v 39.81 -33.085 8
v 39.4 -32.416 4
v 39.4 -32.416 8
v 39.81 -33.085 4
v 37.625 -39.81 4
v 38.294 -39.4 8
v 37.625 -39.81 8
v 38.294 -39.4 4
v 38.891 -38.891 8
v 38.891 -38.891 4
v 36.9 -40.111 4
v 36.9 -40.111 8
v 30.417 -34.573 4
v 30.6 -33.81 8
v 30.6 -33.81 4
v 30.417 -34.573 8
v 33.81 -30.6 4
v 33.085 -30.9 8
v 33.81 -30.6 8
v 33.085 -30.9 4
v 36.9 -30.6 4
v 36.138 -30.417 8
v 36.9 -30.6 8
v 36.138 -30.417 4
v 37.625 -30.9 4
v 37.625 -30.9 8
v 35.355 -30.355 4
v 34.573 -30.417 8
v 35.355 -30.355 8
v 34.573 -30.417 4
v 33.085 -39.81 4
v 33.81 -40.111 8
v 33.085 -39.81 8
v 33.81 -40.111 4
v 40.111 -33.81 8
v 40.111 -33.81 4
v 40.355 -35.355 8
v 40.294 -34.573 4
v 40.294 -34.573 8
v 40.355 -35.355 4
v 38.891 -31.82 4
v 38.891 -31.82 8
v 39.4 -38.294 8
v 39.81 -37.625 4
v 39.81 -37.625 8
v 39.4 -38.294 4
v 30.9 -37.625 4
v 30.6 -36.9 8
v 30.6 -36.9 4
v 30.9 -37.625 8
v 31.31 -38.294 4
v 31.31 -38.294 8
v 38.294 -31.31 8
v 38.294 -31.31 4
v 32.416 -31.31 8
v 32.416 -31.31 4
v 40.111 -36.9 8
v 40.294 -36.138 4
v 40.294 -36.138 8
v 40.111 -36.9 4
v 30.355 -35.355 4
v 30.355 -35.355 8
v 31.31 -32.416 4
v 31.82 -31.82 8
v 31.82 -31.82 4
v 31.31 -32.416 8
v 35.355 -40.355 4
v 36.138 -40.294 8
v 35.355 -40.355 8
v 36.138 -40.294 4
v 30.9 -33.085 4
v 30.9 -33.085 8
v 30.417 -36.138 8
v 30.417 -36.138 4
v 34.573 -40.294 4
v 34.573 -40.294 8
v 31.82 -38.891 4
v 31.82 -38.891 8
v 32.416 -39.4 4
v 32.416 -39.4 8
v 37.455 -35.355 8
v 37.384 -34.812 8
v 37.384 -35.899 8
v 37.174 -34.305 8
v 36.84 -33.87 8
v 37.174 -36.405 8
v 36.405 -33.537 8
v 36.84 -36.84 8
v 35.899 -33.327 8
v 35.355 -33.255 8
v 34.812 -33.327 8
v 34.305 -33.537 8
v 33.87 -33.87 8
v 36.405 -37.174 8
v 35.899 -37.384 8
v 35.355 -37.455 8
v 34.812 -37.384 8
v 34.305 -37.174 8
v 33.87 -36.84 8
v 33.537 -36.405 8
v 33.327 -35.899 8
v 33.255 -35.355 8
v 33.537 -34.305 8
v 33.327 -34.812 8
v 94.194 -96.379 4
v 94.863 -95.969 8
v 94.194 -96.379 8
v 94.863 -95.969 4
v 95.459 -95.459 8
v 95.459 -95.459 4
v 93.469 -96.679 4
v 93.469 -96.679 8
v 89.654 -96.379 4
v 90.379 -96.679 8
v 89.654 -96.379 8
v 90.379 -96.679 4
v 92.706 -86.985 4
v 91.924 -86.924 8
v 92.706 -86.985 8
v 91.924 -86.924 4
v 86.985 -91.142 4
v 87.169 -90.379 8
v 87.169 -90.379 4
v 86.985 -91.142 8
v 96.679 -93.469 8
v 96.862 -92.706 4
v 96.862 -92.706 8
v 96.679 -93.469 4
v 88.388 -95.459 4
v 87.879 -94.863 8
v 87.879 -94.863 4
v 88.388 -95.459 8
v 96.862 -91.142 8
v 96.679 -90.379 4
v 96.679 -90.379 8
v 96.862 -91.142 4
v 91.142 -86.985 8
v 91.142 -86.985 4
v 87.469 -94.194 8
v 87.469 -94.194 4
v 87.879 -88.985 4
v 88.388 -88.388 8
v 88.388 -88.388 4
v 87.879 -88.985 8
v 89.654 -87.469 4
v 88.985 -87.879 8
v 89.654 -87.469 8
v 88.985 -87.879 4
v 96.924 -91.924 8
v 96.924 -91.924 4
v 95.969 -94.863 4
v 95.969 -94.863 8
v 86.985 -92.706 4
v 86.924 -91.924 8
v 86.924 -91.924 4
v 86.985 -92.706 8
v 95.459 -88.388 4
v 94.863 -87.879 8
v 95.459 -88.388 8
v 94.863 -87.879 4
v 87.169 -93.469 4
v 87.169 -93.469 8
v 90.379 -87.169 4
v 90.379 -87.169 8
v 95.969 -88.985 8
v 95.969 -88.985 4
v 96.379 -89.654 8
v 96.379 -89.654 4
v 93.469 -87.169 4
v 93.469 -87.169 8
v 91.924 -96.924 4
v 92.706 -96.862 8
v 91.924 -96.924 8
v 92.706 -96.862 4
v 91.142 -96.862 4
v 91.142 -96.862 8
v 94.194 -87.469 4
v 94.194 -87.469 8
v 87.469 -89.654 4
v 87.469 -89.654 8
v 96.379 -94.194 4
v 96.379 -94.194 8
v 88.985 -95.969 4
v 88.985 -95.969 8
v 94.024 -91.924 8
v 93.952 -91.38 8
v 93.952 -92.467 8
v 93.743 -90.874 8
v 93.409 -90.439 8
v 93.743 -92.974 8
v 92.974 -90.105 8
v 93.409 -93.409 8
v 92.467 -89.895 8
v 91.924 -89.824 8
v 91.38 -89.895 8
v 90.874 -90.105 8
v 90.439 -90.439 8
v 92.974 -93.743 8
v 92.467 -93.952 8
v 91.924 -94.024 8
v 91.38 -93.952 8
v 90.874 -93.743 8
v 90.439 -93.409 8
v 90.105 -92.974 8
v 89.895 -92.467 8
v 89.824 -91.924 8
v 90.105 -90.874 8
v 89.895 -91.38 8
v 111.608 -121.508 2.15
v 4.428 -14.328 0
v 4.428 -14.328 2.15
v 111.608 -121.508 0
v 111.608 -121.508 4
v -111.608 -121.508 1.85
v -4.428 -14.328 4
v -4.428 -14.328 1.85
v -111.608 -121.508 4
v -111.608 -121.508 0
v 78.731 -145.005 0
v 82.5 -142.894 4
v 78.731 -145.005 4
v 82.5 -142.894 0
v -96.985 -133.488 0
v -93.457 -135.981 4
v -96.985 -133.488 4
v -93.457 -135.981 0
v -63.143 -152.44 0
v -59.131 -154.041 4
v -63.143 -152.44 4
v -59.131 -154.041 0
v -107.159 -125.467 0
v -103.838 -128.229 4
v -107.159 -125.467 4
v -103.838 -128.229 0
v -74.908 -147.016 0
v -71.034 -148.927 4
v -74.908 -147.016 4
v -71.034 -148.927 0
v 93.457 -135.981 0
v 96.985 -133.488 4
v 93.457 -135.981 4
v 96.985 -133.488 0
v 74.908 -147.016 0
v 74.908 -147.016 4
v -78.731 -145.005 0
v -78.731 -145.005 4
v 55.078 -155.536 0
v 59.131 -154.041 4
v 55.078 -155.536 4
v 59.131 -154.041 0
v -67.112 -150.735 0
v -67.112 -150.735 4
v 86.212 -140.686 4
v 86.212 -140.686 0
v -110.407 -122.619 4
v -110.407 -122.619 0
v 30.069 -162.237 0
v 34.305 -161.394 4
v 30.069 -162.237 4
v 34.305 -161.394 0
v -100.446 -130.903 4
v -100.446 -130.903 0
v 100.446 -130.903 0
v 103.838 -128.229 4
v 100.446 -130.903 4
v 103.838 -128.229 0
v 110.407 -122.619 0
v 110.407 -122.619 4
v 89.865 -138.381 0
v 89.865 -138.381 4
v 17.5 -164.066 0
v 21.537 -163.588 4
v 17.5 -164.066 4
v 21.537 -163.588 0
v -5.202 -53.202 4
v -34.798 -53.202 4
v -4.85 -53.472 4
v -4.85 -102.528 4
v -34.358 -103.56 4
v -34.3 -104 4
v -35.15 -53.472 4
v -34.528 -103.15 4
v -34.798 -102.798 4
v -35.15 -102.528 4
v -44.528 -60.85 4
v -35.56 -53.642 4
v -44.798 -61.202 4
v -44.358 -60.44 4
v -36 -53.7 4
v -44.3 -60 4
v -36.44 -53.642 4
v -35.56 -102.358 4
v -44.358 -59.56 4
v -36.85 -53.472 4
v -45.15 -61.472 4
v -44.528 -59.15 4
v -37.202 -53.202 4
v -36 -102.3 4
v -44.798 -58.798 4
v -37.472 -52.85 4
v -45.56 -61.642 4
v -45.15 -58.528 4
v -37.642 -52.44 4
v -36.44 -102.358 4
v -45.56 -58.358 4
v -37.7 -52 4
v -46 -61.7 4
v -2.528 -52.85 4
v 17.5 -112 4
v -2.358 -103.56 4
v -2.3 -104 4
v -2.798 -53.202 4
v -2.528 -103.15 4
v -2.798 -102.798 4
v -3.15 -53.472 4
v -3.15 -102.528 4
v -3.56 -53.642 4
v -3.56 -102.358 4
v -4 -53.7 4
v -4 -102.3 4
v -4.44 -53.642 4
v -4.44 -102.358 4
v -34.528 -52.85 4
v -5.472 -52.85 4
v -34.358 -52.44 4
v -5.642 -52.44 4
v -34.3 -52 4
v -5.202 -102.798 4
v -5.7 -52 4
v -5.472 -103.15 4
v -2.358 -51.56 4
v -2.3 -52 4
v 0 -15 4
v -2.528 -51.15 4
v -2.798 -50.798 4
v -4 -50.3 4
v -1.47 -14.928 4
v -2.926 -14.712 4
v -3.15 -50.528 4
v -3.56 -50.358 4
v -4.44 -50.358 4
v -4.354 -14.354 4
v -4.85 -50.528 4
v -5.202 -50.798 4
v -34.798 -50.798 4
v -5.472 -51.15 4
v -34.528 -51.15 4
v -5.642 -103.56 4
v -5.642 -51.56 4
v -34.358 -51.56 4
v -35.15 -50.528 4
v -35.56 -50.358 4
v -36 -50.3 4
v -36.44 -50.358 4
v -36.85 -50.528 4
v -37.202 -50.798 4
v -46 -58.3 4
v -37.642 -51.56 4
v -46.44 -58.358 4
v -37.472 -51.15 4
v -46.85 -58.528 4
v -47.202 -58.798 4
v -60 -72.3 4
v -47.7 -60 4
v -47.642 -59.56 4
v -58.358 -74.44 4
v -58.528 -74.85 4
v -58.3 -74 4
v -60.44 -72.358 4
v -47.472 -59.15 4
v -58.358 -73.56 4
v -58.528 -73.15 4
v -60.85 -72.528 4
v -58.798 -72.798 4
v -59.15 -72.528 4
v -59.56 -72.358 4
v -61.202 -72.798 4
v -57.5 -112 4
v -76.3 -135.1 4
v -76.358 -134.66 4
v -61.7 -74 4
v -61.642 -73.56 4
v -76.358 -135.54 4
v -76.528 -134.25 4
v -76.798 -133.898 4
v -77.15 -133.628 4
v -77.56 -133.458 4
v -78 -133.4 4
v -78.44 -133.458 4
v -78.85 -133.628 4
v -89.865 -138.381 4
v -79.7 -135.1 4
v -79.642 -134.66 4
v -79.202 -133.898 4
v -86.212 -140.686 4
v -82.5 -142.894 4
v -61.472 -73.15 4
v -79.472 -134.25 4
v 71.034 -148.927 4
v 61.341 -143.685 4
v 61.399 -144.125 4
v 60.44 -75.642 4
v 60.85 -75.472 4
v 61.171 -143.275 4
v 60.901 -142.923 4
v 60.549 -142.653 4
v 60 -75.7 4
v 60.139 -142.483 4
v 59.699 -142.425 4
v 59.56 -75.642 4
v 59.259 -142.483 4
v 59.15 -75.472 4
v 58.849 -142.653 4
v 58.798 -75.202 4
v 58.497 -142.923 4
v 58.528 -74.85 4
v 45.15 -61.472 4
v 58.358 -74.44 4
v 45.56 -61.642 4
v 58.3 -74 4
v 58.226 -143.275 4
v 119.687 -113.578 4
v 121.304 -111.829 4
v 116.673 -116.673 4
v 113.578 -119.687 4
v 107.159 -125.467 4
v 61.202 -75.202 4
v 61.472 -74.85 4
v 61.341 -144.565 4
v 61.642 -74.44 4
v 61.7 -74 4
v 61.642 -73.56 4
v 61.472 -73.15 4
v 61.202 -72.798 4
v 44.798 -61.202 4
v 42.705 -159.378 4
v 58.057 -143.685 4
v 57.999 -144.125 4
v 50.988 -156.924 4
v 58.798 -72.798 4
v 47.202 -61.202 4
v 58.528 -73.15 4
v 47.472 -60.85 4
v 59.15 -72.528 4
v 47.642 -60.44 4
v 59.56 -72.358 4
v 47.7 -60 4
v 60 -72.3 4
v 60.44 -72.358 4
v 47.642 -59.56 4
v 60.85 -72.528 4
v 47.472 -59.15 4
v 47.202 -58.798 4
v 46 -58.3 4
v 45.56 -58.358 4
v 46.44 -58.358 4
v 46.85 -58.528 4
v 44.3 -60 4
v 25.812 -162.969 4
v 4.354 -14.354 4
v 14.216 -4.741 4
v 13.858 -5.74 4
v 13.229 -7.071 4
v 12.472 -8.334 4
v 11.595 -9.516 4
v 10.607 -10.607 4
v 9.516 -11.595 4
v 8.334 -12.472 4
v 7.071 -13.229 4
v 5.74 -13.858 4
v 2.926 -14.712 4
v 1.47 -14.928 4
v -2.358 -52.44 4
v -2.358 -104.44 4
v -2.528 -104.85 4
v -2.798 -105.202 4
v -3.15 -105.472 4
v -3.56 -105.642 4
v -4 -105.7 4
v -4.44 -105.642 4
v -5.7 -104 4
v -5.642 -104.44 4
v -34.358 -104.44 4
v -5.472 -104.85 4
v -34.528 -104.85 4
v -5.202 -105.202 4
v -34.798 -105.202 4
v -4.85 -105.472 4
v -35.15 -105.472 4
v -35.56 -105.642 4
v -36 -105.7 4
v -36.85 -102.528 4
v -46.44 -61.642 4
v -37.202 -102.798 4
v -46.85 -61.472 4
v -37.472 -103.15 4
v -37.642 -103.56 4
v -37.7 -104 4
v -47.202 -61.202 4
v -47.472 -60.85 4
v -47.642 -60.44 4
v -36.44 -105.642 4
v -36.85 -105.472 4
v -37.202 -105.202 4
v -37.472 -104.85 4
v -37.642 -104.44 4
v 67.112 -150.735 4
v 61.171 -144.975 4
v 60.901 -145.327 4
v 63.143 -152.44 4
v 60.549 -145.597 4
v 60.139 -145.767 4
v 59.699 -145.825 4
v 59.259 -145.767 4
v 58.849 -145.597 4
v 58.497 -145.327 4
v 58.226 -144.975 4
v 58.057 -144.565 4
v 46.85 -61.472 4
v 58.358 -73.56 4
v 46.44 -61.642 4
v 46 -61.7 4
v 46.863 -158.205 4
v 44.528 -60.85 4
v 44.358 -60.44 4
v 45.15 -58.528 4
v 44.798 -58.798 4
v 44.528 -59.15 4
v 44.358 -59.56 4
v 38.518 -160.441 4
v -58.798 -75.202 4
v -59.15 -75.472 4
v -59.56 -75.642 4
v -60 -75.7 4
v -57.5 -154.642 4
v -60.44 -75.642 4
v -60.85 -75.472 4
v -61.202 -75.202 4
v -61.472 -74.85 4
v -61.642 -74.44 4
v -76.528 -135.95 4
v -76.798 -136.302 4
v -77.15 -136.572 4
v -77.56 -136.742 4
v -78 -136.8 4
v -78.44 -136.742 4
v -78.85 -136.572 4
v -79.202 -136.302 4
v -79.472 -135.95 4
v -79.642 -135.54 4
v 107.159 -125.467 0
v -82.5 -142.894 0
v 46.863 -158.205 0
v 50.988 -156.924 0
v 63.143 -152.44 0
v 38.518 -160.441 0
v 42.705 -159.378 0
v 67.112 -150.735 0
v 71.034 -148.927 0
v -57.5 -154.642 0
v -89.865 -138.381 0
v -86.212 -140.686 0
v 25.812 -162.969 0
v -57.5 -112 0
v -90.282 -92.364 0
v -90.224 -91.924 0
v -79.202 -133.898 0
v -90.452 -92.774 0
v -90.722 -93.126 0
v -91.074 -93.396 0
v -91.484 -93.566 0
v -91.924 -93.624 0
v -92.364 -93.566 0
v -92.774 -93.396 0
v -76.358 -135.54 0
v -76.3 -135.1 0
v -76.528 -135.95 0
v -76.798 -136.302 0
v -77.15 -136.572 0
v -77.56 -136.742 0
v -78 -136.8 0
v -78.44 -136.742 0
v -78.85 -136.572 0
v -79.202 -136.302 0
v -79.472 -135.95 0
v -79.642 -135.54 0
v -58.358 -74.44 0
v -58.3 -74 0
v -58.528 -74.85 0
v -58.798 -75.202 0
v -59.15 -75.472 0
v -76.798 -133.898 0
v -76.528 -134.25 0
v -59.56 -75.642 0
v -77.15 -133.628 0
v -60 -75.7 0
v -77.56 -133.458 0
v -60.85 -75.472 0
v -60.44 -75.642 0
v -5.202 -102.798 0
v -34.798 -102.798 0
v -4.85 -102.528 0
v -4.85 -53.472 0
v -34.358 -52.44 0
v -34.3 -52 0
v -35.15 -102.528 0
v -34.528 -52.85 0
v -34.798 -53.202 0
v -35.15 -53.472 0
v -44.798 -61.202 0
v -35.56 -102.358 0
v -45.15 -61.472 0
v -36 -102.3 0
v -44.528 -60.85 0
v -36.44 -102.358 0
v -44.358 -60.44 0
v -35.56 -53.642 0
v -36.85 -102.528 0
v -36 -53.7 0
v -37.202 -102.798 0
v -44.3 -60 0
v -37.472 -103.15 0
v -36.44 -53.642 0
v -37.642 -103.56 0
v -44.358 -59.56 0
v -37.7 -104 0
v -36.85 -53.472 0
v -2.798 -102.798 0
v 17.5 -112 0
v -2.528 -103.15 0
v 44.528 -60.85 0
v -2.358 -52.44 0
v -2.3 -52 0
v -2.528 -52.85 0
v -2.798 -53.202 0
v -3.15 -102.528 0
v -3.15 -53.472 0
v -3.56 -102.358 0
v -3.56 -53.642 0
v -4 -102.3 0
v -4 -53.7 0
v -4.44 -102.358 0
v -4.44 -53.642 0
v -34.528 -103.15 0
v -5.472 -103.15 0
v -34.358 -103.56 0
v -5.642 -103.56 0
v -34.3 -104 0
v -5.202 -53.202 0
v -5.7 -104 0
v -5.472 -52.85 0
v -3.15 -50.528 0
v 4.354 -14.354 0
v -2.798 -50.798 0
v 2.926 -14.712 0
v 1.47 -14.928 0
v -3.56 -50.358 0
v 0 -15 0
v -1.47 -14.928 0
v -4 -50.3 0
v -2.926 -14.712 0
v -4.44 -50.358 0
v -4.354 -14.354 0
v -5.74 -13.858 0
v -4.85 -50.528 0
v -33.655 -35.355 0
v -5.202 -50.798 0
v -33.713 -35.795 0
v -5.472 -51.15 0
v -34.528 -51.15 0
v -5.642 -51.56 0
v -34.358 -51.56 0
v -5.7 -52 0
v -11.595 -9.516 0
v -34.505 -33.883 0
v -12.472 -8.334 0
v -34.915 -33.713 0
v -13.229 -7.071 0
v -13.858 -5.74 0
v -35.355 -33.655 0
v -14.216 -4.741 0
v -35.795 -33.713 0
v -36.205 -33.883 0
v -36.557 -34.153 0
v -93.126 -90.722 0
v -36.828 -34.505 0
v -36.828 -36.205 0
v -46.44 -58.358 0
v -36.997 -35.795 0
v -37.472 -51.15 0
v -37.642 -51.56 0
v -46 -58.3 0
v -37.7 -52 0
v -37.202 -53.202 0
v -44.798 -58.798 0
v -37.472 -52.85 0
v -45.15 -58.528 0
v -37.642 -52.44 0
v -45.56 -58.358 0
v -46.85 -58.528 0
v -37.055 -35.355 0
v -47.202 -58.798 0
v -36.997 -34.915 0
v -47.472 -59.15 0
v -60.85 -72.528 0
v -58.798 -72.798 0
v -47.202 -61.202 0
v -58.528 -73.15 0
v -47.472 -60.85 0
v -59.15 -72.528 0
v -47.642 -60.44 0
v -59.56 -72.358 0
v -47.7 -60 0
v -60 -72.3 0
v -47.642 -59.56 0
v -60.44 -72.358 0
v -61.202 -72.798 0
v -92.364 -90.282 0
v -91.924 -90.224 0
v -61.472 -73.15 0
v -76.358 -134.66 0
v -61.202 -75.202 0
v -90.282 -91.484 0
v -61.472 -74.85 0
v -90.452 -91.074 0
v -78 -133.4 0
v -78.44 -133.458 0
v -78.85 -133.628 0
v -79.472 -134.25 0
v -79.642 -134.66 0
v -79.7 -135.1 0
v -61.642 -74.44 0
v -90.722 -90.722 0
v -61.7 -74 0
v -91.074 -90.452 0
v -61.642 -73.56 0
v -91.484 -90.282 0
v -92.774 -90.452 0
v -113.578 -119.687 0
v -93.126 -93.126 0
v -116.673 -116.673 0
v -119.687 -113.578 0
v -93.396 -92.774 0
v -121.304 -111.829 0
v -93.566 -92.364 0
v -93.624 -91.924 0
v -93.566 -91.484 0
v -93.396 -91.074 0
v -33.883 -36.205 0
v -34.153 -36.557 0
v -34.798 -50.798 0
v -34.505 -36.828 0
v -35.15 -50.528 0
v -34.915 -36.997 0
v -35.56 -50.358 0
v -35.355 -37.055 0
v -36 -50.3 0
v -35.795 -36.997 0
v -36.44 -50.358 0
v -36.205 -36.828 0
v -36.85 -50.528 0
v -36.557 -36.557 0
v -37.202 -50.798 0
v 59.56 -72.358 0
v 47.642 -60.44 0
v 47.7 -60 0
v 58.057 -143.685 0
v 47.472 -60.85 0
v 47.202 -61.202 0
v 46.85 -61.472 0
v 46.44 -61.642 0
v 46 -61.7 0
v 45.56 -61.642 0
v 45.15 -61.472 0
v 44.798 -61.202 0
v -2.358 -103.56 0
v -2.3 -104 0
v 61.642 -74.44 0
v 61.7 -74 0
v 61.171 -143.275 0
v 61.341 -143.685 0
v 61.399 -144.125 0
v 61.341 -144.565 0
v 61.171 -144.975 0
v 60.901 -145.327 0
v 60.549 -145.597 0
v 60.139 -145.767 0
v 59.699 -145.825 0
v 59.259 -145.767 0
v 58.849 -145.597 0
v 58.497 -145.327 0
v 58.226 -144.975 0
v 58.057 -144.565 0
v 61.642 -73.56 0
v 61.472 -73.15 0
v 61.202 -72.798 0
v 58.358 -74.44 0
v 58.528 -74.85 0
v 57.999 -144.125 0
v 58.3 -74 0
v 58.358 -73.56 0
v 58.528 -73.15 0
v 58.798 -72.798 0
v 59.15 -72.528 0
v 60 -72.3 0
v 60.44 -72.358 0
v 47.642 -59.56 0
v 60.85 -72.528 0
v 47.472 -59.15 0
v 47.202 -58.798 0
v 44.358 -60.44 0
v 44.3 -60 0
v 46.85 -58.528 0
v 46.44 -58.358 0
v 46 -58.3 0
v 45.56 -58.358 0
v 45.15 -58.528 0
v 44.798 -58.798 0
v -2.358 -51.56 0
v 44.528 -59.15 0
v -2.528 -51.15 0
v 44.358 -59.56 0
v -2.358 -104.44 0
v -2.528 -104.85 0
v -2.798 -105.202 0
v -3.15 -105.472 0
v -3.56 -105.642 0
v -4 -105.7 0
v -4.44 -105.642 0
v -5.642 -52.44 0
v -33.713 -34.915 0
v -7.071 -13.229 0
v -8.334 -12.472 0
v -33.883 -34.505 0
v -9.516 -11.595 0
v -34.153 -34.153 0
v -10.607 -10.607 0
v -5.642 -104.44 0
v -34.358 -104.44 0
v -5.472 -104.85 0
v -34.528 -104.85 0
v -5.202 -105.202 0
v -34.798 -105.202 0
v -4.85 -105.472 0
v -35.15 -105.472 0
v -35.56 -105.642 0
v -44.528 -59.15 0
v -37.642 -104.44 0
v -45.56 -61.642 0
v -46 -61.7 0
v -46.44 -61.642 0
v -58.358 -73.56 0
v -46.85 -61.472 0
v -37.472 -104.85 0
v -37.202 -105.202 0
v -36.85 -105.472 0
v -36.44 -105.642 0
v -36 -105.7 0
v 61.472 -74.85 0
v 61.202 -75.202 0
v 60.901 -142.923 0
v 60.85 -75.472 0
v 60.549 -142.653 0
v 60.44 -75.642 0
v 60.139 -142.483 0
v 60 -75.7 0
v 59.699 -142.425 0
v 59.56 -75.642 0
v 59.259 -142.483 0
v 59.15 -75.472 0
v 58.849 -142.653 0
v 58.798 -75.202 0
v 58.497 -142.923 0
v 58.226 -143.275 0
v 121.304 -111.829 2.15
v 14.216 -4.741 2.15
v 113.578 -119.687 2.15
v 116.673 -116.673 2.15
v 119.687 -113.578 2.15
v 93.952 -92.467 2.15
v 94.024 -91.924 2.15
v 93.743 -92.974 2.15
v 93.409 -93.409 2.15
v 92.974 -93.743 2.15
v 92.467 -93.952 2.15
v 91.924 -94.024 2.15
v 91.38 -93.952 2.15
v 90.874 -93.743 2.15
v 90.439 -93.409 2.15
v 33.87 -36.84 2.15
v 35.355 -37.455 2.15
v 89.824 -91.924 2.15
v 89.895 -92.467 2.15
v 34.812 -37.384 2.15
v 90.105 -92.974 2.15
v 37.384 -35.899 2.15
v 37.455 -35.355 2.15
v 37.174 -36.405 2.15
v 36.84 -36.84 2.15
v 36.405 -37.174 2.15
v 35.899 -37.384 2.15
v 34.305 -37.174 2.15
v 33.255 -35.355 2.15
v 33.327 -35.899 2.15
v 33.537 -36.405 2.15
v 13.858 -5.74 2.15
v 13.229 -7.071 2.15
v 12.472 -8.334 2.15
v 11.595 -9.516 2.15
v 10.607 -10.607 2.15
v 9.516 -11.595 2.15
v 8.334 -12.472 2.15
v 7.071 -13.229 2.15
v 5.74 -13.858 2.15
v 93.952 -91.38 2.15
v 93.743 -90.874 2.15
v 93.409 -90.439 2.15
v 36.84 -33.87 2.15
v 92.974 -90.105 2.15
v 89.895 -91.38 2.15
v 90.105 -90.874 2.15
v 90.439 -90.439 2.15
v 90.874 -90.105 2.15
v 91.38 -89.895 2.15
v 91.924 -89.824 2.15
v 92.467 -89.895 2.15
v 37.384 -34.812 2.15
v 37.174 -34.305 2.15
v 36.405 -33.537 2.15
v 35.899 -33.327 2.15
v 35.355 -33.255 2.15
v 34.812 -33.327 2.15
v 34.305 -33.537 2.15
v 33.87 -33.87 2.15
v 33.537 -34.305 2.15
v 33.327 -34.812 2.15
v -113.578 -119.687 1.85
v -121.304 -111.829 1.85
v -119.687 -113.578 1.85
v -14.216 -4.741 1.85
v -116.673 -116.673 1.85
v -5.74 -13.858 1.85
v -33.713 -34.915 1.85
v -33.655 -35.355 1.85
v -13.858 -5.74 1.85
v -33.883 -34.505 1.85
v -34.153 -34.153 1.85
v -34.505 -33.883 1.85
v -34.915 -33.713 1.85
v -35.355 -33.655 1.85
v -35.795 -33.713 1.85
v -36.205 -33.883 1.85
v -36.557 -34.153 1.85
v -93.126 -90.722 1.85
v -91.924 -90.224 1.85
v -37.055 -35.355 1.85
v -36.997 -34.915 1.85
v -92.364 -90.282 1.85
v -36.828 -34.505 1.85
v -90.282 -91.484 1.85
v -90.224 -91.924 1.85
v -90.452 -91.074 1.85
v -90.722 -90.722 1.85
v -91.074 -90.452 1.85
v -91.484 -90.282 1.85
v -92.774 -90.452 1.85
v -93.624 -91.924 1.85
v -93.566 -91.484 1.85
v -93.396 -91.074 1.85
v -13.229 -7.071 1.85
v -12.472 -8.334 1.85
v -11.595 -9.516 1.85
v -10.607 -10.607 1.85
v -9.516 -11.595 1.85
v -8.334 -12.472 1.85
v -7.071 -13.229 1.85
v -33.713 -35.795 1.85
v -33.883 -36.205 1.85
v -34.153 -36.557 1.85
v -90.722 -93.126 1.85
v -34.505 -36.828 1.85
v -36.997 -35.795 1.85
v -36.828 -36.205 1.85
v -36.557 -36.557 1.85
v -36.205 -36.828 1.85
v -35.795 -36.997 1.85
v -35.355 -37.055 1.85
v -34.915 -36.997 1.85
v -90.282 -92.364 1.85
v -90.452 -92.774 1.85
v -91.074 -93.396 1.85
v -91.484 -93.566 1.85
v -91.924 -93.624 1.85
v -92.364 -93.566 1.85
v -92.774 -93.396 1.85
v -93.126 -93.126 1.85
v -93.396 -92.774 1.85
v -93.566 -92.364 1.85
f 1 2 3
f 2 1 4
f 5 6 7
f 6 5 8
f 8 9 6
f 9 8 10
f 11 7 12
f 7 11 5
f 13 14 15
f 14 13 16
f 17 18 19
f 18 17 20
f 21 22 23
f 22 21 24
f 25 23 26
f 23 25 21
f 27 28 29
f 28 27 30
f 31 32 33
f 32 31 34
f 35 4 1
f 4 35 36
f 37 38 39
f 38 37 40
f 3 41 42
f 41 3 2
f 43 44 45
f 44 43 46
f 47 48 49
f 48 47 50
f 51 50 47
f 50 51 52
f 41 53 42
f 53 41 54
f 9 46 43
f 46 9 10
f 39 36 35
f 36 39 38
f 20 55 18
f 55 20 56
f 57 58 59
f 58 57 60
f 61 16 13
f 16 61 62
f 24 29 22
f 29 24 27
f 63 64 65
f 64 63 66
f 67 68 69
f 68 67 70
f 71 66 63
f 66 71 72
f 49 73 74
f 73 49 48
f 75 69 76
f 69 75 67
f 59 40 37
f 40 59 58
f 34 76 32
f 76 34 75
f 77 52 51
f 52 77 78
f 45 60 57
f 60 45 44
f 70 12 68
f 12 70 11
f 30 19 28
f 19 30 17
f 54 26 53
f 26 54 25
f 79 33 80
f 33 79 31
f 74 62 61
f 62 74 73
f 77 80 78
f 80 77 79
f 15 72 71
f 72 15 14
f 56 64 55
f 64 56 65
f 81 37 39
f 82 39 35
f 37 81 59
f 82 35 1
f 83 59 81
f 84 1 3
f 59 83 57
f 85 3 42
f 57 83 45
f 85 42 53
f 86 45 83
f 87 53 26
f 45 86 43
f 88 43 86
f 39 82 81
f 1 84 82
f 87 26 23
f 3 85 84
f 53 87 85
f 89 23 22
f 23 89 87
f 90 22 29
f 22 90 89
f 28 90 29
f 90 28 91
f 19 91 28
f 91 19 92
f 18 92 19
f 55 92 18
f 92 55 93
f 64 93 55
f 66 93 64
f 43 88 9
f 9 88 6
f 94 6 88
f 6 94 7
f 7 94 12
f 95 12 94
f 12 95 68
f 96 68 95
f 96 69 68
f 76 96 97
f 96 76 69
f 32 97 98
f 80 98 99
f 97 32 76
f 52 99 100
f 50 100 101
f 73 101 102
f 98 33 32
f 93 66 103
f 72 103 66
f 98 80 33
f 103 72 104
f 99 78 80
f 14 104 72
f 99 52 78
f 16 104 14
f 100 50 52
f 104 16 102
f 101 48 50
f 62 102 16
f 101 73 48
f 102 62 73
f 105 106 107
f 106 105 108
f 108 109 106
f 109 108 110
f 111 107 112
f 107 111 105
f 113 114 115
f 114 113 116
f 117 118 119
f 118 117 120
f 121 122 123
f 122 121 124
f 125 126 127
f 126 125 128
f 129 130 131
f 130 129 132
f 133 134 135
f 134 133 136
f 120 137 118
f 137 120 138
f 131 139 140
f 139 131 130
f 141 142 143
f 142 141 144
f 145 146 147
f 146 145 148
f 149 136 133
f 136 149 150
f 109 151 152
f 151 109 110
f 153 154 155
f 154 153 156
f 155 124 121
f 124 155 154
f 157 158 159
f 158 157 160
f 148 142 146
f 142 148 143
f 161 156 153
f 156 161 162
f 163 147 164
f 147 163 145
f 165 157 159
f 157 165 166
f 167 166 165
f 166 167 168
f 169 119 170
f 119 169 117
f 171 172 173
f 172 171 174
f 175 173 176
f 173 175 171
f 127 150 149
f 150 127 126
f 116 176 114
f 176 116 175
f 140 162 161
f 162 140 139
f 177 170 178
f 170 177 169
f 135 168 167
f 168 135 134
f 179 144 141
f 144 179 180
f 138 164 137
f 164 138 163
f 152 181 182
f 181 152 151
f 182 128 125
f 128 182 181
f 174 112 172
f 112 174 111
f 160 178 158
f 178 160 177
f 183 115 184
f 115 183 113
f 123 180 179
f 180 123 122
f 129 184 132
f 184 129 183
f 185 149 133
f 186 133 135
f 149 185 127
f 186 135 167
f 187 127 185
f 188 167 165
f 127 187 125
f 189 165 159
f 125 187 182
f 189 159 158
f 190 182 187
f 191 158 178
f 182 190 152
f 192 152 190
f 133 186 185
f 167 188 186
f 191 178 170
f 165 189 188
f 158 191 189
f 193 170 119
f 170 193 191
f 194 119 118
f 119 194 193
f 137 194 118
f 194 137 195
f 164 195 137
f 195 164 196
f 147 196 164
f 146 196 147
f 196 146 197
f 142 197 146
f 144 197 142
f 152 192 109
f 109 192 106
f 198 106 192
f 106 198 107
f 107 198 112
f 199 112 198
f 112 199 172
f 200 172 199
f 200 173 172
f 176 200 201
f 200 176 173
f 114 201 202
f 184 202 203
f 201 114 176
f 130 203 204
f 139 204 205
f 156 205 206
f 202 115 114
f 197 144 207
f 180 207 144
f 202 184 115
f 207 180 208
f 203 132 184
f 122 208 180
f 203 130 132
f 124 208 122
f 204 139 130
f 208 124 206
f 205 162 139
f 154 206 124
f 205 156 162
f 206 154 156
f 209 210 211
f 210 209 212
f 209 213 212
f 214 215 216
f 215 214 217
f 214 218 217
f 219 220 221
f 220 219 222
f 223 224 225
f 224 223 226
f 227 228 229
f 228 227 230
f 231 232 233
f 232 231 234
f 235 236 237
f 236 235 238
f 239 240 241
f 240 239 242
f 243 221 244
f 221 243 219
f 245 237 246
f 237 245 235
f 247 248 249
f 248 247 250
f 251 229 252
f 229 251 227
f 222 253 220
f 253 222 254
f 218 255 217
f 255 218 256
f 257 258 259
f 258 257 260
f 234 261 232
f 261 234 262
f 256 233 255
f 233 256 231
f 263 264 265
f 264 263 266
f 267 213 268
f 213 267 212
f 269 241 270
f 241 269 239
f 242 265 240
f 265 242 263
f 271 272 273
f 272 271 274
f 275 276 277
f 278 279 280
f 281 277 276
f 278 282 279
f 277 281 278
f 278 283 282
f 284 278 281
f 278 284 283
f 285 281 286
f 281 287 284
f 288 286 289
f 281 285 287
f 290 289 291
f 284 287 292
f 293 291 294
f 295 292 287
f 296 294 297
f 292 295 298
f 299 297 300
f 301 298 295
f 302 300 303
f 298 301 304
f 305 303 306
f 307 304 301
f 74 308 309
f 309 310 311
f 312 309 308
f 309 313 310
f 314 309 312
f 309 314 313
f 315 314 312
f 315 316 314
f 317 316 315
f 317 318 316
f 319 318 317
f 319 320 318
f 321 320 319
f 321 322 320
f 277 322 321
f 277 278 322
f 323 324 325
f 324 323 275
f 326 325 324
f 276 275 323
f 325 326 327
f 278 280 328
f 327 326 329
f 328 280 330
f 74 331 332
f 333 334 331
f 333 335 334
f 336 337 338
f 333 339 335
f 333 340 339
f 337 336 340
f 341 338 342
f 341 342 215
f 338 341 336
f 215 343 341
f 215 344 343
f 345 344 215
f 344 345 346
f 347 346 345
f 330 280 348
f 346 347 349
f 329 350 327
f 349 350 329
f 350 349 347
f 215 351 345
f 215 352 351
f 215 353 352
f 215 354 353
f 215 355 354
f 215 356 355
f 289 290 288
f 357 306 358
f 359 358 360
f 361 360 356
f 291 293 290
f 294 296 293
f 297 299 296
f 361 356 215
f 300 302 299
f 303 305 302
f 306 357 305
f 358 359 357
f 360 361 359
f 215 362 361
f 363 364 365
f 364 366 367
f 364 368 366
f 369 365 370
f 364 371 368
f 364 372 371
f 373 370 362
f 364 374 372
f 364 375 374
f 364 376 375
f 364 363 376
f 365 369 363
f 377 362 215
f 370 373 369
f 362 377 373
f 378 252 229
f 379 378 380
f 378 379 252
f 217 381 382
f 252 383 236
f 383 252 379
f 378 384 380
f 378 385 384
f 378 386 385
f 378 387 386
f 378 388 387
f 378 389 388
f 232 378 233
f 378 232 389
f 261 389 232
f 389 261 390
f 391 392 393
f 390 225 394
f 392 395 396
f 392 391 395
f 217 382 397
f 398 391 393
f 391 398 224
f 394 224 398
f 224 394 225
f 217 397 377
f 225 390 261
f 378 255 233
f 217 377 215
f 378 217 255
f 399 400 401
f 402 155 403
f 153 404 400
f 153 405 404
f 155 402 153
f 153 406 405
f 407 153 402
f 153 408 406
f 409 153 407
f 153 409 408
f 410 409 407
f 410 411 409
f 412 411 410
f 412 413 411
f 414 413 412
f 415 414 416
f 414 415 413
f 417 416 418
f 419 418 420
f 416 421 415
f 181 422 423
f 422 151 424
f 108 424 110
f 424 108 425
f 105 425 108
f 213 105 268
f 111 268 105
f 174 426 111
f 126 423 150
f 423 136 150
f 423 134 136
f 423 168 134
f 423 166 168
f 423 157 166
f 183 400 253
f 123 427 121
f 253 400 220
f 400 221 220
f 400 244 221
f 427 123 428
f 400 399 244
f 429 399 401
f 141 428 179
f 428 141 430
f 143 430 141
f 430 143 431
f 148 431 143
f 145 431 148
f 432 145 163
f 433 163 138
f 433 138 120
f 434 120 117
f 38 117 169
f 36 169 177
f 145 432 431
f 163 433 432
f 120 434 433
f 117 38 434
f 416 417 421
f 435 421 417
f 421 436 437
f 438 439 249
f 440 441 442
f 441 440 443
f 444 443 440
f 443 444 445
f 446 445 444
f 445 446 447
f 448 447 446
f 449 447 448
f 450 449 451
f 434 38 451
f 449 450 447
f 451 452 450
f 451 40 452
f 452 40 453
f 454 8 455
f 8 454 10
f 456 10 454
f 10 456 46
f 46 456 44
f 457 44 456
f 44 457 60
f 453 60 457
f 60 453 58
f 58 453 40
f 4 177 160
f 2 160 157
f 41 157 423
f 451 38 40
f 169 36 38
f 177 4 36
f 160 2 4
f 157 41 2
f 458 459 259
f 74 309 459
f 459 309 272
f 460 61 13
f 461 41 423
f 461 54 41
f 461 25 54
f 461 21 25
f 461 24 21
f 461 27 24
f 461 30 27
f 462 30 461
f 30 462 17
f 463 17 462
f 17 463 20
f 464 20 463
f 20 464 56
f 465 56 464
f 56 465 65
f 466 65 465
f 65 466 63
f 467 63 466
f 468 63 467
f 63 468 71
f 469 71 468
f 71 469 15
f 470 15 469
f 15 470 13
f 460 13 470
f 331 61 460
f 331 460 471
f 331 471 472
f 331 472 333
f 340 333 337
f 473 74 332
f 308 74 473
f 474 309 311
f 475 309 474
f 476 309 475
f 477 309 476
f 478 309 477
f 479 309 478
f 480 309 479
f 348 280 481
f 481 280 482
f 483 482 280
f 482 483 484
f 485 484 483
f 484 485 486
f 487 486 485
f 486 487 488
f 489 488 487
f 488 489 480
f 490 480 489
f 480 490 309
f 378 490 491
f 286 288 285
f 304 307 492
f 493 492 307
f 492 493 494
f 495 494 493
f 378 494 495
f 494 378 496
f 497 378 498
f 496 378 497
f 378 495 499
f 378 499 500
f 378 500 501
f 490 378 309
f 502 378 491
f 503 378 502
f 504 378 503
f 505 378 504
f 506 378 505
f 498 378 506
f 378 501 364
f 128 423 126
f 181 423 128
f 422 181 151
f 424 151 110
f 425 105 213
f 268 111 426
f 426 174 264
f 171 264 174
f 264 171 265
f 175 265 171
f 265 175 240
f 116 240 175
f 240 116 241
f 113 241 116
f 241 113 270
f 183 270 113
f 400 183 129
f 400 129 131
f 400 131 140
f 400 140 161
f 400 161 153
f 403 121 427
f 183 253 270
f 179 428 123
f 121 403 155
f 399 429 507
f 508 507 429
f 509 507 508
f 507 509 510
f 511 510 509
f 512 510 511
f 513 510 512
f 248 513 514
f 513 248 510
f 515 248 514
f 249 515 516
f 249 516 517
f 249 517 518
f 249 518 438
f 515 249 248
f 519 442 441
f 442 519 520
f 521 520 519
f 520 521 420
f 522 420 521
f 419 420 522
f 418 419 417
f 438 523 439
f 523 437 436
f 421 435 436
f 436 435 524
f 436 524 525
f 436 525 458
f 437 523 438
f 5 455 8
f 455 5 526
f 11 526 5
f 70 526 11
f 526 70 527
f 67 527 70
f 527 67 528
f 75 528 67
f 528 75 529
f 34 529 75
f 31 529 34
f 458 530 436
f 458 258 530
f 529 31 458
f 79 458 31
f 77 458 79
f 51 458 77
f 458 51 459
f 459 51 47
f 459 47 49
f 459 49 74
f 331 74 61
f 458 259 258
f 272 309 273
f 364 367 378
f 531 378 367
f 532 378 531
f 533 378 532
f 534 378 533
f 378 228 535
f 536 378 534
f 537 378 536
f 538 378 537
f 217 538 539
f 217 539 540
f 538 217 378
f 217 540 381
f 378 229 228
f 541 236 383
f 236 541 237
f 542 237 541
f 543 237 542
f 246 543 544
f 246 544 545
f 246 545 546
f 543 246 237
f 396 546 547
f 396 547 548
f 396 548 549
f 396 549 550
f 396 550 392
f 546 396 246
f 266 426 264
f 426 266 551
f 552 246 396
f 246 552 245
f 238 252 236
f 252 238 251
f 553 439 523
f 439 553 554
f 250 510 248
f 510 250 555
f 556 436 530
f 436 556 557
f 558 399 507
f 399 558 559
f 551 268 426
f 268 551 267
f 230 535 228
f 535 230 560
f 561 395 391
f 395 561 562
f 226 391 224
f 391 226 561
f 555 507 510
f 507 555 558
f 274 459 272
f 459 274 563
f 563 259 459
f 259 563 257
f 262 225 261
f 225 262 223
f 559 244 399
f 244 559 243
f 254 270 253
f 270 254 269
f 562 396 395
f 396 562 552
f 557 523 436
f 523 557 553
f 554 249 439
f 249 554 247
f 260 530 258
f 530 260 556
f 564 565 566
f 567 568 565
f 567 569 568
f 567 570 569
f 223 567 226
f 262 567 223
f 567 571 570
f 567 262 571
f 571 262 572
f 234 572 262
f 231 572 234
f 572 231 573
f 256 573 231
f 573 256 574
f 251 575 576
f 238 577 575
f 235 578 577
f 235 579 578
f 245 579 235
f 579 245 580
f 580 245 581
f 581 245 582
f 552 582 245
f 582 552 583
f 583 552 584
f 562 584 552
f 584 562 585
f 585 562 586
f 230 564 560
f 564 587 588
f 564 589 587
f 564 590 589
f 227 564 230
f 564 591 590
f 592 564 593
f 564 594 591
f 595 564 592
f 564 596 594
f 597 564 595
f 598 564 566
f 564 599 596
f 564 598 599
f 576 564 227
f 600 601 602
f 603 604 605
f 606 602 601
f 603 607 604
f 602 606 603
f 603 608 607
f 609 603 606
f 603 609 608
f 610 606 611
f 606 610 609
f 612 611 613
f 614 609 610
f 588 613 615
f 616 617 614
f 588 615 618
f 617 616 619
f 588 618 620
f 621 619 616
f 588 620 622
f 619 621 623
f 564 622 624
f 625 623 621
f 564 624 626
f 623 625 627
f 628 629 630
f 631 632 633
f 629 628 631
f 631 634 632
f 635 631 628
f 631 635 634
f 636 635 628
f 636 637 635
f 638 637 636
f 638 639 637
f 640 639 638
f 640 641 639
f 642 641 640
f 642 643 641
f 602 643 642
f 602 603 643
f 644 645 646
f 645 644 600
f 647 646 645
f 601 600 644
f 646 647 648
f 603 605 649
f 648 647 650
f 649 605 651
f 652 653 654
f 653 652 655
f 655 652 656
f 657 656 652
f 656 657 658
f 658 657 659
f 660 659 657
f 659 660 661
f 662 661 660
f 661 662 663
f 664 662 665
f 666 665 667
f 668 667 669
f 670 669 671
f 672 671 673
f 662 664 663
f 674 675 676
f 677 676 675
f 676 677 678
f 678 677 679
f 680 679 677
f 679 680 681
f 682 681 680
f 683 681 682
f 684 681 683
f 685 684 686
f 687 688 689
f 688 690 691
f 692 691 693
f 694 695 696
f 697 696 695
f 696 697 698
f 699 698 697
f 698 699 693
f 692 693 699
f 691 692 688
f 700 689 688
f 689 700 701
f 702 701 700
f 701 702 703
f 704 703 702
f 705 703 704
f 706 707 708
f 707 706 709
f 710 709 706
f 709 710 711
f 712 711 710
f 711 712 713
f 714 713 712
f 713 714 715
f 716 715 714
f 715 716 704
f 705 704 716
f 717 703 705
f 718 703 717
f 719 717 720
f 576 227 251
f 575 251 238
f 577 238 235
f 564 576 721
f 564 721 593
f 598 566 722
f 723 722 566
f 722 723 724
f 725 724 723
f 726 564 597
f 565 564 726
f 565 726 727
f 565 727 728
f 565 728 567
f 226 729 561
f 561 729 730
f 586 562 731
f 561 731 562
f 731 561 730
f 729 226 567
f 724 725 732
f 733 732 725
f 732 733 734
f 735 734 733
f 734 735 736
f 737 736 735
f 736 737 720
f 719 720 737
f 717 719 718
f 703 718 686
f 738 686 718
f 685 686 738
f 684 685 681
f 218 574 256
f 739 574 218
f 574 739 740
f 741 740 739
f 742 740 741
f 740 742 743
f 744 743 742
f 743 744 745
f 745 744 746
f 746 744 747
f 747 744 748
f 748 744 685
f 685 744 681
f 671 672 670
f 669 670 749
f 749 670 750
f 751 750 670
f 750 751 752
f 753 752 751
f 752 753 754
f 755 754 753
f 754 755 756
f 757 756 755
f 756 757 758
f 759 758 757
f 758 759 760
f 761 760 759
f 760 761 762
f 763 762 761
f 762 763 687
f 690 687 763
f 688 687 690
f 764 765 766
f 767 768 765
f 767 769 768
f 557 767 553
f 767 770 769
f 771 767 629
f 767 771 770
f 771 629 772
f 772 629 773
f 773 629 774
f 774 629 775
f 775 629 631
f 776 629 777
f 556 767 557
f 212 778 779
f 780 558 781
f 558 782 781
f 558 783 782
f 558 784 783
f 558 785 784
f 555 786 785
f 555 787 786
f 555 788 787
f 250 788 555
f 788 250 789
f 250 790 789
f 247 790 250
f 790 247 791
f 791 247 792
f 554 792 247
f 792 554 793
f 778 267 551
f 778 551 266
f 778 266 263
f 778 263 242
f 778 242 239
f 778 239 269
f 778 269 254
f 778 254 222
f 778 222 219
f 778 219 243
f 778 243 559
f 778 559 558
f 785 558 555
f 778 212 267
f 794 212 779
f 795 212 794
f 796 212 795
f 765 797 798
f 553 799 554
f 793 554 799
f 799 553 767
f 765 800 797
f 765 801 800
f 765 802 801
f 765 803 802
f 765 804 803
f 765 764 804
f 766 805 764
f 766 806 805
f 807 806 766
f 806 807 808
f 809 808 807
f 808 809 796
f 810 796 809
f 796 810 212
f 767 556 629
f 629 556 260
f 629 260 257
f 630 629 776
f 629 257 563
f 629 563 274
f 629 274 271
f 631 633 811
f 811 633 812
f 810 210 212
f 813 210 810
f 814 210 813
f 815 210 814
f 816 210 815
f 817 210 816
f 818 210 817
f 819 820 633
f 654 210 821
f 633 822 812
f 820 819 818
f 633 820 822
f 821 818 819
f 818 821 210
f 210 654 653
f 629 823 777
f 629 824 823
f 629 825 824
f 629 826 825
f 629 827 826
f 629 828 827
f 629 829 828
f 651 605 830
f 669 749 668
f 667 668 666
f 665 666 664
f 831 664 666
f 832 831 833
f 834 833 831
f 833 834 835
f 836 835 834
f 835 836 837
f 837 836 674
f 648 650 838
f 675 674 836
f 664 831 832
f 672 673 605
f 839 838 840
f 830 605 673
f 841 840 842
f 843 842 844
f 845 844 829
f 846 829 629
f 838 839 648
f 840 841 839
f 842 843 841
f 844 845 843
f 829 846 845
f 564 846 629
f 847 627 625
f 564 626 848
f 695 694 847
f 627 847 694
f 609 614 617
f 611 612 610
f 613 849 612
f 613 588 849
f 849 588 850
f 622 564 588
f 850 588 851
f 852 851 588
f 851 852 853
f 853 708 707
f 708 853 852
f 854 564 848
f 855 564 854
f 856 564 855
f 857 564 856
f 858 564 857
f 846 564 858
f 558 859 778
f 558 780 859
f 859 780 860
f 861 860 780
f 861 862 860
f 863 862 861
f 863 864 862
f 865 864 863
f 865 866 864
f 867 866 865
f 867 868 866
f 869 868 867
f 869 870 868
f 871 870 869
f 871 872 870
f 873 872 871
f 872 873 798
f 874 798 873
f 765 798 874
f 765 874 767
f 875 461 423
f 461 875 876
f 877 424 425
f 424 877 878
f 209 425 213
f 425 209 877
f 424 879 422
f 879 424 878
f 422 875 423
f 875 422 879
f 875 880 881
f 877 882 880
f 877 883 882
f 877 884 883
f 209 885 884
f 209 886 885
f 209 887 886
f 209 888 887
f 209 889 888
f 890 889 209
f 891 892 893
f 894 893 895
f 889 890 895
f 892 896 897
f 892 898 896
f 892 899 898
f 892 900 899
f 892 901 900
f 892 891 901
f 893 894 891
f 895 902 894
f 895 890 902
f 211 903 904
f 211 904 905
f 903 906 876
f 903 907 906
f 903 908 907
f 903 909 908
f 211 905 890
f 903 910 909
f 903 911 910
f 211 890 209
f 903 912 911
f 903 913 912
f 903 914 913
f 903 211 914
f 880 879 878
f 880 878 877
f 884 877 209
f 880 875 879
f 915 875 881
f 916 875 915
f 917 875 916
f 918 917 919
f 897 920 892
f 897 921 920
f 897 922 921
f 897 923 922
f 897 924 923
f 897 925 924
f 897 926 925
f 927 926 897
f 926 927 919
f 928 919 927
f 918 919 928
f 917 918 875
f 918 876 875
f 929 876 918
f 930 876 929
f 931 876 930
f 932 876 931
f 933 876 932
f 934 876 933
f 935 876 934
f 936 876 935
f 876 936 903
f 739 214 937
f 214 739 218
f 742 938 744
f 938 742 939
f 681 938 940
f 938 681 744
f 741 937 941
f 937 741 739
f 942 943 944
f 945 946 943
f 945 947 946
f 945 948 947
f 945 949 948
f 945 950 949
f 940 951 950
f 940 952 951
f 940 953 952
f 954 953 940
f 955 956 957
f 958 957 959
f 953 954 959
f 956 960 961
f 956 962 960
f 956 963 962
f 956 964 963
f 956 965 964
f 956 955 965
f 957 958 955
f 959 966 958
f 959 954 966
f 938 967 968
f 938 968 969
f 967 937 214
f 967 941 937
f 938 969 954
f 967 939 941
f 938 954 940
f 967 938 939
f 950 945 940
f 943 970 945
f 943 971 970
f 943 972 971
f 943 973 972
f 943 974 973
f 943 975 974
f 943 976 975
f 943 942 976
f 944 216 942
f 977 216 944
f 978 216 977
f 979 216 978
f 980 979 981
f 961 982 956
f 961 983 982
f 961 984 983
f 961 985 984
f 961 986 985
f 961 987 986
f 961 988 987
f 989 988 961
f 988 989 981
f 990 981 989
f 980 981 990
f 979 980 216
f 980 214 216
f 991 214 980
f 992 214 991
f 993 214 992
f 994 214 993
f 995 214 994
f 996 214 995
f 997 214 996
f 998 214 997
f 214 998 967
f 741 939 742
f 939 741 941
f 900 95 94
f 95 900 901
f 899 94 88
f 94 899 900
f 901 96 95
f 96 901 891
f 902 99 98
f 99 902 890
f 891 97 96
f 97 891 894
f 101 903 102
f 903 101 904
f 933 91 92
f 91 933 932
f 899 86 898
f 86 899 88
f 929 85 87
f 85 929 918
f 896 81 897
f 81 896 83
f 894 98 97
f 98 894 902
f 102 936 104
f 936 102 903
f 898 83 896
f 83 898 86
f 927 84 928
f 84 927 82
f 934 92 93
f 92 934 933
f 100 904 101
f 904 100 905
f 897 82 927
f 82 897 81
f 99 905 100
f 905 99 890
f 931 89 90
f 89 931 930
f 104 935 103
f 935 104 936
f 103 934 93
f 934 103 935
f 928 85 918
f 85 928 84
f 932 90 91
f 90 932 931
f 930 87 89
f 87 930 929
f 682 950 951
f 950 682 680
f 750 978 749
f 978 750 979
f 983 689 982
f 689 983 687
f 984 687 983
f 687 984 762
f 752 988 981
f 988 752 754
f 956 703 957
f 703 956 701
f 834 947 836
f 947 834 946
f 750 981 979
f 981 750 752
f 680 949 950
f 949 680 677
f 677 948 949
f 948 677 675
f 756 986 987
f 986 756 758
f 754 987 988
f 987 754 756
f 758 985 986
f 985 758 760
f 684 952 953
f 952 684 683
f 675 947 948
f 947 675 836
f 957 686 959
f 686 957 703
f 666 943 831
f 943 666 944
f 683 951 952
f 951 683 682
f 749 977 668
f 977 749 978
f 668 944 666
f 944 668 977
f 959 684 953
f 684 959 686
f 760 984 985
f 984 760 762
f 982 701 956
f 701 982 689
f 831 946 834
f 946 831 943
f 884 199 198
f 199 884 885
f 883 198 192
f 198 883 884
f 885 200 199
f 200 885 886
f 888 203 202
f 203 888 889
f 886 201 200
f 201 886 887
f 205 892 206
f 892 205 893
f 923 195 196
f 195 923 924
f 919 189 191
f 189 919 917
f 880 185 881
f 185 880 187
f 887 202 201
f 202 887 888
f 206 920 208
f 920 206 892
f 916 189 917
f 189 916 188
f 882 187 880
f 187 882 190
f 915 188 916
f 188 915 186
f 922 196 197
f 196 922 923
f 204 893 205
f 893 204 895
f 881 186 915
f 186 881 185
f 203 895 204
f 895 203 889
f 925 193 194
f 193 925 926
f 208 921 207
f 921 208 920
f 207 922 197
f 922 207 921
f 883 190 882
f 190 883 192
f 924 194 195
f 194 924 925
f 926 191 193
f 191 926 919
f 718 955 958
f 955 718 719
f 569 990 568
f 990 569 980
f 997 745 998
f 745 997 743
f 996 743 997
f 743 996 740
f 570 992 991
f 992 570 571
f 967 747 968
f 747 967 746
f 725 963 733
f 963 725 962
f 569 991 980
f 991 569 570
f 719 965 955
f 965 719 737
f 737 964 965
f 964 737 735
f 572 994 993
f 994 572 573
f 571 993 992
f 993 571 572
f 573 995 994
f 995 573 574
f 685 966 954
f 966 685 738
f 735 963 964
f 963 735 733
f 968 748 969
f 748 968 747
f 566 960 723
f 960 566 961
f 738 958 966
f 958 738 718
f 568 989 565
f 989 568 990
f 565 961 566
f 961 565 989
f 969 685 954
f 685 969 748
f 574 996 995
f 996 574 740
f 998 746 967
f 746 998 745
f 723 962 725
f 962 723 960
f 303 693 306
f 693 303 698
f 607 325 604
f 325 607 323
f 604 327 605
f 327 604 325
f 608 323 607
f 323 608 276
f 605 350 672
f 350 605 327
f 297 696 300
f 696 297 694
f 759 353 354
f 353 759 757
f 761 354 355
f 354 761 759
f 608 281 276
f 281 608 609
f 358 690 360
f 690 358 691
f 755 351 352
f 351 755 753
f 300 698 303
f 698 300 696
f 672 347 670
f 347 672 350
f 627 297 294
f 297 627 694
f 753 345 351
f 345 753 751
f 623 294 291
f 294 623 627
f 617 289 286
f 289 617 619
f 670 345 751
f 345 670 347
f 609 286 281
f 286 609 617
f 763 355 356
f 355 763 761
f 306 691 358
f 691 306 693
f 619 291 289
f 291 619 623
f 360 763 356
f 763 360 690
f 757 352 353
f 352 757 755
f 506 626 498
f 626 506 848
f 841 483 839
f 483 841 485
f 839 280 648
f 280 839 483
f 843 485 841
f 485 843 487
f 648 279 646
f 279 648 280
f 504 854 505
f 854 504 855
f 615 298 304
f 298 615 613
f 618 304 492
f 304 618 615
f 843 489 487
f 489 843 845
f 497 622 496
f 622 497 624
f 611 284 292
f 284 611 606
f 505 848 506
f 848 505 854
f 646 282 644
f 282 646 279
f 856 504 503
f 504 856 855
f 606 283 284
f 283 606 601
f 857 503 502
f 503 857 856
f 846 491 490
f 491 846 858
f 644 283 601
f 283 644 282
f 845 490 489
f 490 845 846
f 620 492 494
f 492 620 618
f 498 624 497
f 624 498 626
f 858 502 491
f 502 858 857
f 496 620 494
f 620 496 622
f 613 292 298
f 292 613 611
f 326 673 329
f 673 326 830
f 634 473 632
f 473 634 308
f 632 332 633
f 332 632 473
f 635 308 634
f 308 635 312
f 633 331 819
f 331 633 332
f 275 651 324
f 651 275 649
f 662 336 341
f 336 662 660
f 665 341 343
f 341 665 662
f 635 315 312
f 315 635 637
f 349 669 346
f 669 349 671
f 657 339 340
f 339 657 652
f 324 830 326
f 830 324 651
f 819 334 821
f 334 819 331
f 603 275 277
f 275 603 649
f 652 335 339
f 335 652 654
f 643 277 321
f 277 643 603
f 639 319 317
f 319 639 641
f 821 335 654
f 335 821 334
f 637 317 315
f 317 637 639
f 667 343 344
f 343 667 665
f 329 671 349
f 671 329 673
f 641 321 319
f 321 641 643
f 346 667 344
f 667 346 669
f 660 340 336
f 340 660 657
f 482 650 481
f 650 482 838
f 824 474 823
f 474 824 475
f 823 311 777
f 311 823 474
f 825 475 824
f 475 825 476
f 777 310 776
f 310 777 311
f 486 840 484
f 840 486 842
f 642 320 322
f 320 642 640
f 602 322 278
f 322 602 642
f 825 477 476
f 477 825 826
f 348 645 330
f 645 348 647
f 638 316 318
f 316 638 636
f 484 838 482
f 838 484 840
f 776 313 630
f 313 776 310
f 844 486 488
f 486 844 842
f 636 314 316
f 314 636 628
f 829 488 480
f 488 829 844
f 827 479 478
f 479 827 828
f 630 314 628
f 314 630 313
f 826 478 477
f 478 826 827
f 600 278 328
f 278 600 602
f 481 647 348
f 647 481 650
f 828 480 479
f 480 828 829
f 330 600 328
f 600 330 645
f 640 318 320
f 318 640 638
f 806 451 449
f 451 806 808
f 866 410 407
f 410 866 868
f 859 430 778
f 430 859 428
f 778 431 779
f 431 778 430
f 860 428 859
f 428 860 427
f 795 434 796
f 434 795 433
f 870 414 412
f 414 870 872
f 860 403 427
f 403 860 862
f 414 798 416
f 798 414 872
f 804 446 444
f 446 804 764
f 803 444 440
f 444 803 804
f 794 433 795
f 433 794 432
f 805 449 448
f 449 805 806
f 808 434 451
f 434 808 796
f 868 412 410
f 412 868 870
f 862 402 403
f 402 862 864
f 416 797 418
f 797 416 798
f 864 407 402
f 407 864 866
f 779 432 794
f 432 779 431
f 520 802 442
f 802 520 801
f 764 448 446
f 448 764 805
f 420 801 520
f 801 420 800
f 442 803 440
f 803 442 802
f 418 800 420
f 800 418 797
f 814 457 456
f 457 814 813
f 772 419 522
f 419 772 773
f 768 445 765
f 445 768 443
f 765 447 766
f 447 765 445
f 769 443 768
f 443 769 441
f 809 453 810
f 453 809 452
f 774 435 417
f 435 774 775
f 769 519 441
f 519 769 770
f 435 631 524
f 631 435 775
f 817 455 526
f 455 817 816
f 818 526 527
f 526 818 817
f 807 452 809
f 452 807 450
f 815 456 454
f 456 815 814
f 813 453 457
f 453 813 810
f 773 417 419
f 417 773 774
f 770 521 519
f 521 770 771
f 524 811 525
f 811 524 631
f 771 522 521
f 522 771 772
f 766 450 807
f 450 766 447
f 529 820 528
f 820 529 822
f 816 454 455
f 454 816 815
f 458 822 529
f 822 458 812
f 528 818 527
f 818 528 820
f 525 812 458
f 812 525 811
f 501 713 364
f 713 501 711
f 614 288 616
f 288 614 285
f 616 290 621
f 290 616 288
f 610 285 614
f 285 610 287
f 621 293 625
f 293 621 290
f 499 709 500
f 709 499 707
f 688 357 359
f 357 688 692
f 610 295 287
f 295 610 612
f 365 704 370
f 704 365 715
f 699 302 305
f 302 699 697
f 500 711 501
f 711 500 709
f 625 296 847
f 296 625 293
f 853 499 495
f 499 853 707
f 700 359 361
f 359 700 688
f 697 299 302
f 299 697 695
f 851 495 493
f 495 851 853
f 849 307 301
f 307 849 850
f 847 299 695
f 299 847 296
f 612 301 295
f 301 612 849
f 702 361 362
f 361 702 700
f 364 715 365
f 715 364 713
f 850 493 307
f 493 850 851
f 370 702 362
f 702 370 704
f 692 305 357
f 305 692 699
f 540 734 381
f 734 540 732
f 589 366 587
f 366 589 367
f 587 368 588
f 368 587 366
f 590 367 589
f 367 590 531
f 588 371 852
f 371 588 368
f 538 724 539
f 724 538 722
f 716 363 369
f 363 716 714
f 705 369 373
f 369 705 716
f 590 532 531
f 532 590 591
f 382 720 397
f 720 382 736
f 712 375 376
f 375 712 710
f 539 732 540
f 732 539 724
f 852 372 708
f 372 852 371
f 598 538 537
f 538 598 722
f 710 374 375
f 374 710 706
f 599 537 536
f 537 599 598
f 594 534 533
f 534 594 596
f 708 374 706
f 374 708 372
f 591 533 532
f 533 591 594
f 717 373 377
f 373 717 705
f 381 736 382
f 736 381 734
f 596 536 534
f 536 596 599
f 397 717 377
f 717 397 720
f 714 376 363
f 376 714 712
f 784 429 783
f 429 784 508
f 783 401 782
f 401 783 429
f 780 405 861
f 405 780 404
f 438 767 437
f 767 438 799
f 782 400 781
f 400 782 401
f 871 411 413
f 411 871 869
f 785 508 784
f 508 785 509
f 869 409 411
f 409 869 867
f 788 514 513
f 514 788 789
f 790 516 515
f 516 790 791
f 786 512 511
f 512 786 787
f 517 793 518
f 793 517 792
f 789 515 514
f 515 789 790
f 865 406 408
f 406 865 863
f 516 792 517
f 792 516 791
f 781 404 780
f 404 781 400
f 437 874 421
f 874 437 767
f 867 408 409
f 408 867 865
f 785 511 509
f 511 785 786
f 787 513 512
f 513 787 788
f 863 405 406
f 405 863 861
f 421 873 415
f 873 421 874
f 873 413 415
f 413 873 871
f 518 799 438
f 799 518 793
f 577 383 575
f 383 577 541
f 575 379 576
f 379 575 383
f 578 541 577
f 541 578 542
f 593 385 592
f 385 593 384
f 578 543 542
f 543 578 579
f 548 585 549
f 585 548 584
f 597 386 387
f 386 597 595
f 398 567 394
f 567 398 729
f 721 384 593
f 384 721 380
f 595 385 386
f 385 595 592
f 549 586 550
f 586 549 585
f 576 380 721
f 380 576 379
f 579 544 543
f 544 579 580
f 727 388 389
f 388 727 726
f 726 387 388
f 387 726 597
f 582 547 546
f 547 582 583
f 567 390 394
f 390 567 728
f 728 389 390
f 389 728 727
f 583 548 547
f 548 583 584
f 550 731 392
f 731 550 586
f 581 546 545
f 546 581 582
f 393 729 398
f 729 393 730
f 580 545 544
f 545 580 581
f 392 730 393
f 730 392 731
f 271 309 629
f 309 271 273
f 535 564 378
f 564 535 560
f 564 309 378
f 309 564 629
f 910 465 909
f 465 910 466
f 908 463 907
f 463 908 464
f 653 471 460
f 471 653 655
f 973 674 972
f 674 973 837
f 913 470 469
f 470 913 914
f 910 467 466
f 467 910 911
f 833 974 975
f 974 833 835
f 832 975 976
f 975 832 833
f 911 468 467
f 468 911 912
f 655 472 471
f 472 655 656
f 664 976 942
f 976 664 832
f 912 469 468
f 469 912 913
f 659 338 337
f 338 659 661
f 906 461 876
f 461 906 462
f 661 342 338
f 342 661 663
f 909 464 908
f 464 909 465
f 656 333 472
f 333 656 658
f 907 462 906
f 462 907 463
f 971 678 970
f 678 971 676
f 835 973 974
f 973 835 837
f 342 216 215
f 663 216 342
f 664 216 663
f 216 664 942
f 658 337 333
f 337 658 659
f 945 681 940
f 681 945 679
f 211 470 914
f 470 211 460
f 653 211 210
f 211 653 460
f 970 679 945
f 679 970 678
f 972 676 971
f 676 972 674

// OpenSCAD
// file: robot_floor_front.scad
// =====================================================================
//  robot body :: floor plate quadrant FRONT (centred on +X). Print 1.
//  The four quadrants (front / left / rear / right) share one generic module,
//  robot_floor_quad(i), defined HERE; robot_floor_left/rear/right.scad `use` this
//  file. The seam scheme is rotationally symmetric, so the quadrants are the same
//  plate rotated by 90 deg plus their own cut-outs.
//  world (robot frame): plate z 14..18, radius rb_R, sector -45..+45 deg.
//    Seams on the diagonals (rb_floor_seams), rb_seam_gap 0.3 mm everywhere.
//    Seam joint = 14 mm wide half-thickness lap. At a quadrant's CCW edge it is the
//    UPPER lap (z 16.15..18, 2x M3 clearance 3.4); at its CW edge it is the LOWER lap
//    (z 14..15.85) with a d10 boss below (z 10..14) carrying a through hole d4.2: the
//    M3 heat-set insert is pressed in from the boss tip, the M3x10 comes from ABOVE
//    through the neighbour's upper lap. Screws at r 50 and r 130 on each seam
//    (clear of the pillar flanges at r 67..103 and of every fixing hole).
//    Plain d3.4 holes at every rb_fix_* point (screws from below, inserts in the parts above).
//    Cable pass d30 at the centre; wheel wells cut per rb_well; ball hole d24 under
//    the caster (rb_caster_xy); rear tip skid dome at rb_skid_xy (lowest z = rb_skid_z).
//  Print: top face on the bed (upside down, z' = 18 - z), 4 mm plate, bosses/skid point up.
//    The 14 mm lower lap overhangs 2.15 mm above the bed: thin support under it.
//  Hardware per seam: 2x M3x10 + 2x M3 heat-set insert (4.2 hole).
// =====================================================================
include <../lib/params.scad>
include <../lib/robot_params.scad>

fl_lap     = 7;                          // lap half width
fl_z0      = rb_clear;  fl_z1 = rb_floor_top;  fl_zm = (fl_z0 + fl_z1) / 2;
fl_seam_r  = [50, 130];                  // screw radii along each seam
fl_boss    = [10, 4];                    // boss d, height below the plate
fl_cable_d = 30;
fl_ball_d  = 24;

function fl_inq(p, c) = abs(((atan2(p[1], p[0]) - c + 180) % 360 + 360) % 360 - 180) < 45;
function fl_pts(c) = [for (p = concat(rb_fix_motor, rb_fix_caster, rb_fix_batt, rb_fix_ebay,
                                       rb_fix_pillar, rb_fix_lid)) if (fl_inq(p, c)) p];

module fl_full2d(s0, s1) {
    intersection() {
        circle(r = rb_R, $fn = 240);
        rotate(s0) translate([-500, fl_lap]) square([1000, 500]);
        rotate(s1) translate([-500, -fl_lap - 500]) square([1000, 500]);
    }
}
module fl_lapB2d(s) intersection() {       // lower lap strip at this quadrant's CW seam
    circle(r = rb_R, $fn = 240);
    rotate(s) translate([0, -fl_lap + rb_seam_gap]) square([rb_R, 2 * fl_lap - rb_seam_gap + 0.5]);
}
module fl_lapA2d(s) intersection() {       // upper lap strip at the CCW seam
    circle(r = rb_R, $fn = 240);
    rotate(s) translate([0, -fl_lap - 0.5]) square([rb_R, 2 * fl_lap - rb_seam_gap + 0.5]);
}

module robot_floor_quad(i) {
    c = i * 90;  s0 = c - 45;  s1 = c + 45;
    g = rb_seam_gap;
    difference() {
        union() {
            translate([0, 0, fl_z0]) linear_extrude(fl_z1 - fl_z0) fl_full2d(s0, s1);
            translate([0, 0, fl_z0]) linear_extrude(fl_zm - g / 2 - fl_z0) fl_lapB2d(s0);
            translate([0, 0, fl_zm + g / 2]) linear_extrude(fl_z1 - fl_zm - g / 2) fl_lapA2d(s1);
            for (r = fl_seam_r) rotate(s0) translate([r, 0, fl_z0 - fl_boss[1]])
                cylinder(d = fl_boss[0], h = fl_boss[1] + 0.5, $fn = 40);
            if (i == 2)                    // rear tip skid dome, lowest point rb_skid_z
                translate([rb_skid_xy[0], rb_skid_xy[1], 0]) intersection() {
                    hull() {
                        translate([0, 0, fl_z0 - 1]) cylinder(r = 13, h = 1.5, $fn = 48);
                        translate([0, 0, rb_skid_z + 8]) sphere(r = 8, $fn = 48);
                    }
                    translate([-20, -20, 0]) cube([40, 40, fl_z1 - 1]);
                }
        }
        // seam screws
        for (r = fl_seam_r) {
            rotate(s0) translate([r, 0, fl_z0 - fl_boss[1] - 1]) cylinder(d = m3_insert_d, h = 20, $fn = 24);
            rotate(s1) translate([r, 0, fl_z0 - 1]) cylinder(d = m3_clear, h = 10, $fn = 24);
        }
        // fixing points
        for (p = fl_pts(c)) translate([p[0], p[1], fl_z0 - 1]) cylinder(d = m3_clear, h = 10, $fn = 24);
        // cable pass
        translate([0, 0, fl_z0 - 1]) cylinder(d = fl_cable_d, h = 10, $fn = 64);
        // ball under the caster
        if (fl_inq(rb_caster_xy, c)) translate([rb_caster_xy[0], rb_caster_xy[1], fl_z0 - 1])
            cylinder(d = fl_ball_d, h = 10, $fn = 64);
        // wheel wells
        for (s = [-1, 1]) translate([rb_axle_x - rb_well[0], s > 0 ? rb_well[1] : -rb_R - 10, fl_z0 - 1])
            cube([2 * rb_well[0], rb_R + 10 - rb_well[1], 10]);
    }
}

module robot_floor_front() robot_floor_quad(0);
module robot_floor_front_print() translate([0, 0, fl_z1]) rotate([180, 0, 0]) robot_floor_front();

robot_floor_front_print();
// main file
// =====================================================================
//  robot body :: floor plate quadrant LEFT (centred on angle 90 deg). Print 1.
//  Same plate as robot_floor_front.scad (generic module robot_floor_quad(i), see its header
//  for the seam scheme, hardware and print orientation) with this quadrant's own cut-outs.
//  Print: top face on the bed (upside down), thin support under the lower lap.
// =====================================================================
include <../lib/params.scad>
include <../lib/robot_params.scad>
use <robot_floor_front.scad>

module robot_floor_left() robot_floor_quad(1);
module robot_floor_left_print() translate([0, 0, rb_floor_top]) rotate([180, 0, 0]) robot_floor_left();

robot_floor_left_print();
